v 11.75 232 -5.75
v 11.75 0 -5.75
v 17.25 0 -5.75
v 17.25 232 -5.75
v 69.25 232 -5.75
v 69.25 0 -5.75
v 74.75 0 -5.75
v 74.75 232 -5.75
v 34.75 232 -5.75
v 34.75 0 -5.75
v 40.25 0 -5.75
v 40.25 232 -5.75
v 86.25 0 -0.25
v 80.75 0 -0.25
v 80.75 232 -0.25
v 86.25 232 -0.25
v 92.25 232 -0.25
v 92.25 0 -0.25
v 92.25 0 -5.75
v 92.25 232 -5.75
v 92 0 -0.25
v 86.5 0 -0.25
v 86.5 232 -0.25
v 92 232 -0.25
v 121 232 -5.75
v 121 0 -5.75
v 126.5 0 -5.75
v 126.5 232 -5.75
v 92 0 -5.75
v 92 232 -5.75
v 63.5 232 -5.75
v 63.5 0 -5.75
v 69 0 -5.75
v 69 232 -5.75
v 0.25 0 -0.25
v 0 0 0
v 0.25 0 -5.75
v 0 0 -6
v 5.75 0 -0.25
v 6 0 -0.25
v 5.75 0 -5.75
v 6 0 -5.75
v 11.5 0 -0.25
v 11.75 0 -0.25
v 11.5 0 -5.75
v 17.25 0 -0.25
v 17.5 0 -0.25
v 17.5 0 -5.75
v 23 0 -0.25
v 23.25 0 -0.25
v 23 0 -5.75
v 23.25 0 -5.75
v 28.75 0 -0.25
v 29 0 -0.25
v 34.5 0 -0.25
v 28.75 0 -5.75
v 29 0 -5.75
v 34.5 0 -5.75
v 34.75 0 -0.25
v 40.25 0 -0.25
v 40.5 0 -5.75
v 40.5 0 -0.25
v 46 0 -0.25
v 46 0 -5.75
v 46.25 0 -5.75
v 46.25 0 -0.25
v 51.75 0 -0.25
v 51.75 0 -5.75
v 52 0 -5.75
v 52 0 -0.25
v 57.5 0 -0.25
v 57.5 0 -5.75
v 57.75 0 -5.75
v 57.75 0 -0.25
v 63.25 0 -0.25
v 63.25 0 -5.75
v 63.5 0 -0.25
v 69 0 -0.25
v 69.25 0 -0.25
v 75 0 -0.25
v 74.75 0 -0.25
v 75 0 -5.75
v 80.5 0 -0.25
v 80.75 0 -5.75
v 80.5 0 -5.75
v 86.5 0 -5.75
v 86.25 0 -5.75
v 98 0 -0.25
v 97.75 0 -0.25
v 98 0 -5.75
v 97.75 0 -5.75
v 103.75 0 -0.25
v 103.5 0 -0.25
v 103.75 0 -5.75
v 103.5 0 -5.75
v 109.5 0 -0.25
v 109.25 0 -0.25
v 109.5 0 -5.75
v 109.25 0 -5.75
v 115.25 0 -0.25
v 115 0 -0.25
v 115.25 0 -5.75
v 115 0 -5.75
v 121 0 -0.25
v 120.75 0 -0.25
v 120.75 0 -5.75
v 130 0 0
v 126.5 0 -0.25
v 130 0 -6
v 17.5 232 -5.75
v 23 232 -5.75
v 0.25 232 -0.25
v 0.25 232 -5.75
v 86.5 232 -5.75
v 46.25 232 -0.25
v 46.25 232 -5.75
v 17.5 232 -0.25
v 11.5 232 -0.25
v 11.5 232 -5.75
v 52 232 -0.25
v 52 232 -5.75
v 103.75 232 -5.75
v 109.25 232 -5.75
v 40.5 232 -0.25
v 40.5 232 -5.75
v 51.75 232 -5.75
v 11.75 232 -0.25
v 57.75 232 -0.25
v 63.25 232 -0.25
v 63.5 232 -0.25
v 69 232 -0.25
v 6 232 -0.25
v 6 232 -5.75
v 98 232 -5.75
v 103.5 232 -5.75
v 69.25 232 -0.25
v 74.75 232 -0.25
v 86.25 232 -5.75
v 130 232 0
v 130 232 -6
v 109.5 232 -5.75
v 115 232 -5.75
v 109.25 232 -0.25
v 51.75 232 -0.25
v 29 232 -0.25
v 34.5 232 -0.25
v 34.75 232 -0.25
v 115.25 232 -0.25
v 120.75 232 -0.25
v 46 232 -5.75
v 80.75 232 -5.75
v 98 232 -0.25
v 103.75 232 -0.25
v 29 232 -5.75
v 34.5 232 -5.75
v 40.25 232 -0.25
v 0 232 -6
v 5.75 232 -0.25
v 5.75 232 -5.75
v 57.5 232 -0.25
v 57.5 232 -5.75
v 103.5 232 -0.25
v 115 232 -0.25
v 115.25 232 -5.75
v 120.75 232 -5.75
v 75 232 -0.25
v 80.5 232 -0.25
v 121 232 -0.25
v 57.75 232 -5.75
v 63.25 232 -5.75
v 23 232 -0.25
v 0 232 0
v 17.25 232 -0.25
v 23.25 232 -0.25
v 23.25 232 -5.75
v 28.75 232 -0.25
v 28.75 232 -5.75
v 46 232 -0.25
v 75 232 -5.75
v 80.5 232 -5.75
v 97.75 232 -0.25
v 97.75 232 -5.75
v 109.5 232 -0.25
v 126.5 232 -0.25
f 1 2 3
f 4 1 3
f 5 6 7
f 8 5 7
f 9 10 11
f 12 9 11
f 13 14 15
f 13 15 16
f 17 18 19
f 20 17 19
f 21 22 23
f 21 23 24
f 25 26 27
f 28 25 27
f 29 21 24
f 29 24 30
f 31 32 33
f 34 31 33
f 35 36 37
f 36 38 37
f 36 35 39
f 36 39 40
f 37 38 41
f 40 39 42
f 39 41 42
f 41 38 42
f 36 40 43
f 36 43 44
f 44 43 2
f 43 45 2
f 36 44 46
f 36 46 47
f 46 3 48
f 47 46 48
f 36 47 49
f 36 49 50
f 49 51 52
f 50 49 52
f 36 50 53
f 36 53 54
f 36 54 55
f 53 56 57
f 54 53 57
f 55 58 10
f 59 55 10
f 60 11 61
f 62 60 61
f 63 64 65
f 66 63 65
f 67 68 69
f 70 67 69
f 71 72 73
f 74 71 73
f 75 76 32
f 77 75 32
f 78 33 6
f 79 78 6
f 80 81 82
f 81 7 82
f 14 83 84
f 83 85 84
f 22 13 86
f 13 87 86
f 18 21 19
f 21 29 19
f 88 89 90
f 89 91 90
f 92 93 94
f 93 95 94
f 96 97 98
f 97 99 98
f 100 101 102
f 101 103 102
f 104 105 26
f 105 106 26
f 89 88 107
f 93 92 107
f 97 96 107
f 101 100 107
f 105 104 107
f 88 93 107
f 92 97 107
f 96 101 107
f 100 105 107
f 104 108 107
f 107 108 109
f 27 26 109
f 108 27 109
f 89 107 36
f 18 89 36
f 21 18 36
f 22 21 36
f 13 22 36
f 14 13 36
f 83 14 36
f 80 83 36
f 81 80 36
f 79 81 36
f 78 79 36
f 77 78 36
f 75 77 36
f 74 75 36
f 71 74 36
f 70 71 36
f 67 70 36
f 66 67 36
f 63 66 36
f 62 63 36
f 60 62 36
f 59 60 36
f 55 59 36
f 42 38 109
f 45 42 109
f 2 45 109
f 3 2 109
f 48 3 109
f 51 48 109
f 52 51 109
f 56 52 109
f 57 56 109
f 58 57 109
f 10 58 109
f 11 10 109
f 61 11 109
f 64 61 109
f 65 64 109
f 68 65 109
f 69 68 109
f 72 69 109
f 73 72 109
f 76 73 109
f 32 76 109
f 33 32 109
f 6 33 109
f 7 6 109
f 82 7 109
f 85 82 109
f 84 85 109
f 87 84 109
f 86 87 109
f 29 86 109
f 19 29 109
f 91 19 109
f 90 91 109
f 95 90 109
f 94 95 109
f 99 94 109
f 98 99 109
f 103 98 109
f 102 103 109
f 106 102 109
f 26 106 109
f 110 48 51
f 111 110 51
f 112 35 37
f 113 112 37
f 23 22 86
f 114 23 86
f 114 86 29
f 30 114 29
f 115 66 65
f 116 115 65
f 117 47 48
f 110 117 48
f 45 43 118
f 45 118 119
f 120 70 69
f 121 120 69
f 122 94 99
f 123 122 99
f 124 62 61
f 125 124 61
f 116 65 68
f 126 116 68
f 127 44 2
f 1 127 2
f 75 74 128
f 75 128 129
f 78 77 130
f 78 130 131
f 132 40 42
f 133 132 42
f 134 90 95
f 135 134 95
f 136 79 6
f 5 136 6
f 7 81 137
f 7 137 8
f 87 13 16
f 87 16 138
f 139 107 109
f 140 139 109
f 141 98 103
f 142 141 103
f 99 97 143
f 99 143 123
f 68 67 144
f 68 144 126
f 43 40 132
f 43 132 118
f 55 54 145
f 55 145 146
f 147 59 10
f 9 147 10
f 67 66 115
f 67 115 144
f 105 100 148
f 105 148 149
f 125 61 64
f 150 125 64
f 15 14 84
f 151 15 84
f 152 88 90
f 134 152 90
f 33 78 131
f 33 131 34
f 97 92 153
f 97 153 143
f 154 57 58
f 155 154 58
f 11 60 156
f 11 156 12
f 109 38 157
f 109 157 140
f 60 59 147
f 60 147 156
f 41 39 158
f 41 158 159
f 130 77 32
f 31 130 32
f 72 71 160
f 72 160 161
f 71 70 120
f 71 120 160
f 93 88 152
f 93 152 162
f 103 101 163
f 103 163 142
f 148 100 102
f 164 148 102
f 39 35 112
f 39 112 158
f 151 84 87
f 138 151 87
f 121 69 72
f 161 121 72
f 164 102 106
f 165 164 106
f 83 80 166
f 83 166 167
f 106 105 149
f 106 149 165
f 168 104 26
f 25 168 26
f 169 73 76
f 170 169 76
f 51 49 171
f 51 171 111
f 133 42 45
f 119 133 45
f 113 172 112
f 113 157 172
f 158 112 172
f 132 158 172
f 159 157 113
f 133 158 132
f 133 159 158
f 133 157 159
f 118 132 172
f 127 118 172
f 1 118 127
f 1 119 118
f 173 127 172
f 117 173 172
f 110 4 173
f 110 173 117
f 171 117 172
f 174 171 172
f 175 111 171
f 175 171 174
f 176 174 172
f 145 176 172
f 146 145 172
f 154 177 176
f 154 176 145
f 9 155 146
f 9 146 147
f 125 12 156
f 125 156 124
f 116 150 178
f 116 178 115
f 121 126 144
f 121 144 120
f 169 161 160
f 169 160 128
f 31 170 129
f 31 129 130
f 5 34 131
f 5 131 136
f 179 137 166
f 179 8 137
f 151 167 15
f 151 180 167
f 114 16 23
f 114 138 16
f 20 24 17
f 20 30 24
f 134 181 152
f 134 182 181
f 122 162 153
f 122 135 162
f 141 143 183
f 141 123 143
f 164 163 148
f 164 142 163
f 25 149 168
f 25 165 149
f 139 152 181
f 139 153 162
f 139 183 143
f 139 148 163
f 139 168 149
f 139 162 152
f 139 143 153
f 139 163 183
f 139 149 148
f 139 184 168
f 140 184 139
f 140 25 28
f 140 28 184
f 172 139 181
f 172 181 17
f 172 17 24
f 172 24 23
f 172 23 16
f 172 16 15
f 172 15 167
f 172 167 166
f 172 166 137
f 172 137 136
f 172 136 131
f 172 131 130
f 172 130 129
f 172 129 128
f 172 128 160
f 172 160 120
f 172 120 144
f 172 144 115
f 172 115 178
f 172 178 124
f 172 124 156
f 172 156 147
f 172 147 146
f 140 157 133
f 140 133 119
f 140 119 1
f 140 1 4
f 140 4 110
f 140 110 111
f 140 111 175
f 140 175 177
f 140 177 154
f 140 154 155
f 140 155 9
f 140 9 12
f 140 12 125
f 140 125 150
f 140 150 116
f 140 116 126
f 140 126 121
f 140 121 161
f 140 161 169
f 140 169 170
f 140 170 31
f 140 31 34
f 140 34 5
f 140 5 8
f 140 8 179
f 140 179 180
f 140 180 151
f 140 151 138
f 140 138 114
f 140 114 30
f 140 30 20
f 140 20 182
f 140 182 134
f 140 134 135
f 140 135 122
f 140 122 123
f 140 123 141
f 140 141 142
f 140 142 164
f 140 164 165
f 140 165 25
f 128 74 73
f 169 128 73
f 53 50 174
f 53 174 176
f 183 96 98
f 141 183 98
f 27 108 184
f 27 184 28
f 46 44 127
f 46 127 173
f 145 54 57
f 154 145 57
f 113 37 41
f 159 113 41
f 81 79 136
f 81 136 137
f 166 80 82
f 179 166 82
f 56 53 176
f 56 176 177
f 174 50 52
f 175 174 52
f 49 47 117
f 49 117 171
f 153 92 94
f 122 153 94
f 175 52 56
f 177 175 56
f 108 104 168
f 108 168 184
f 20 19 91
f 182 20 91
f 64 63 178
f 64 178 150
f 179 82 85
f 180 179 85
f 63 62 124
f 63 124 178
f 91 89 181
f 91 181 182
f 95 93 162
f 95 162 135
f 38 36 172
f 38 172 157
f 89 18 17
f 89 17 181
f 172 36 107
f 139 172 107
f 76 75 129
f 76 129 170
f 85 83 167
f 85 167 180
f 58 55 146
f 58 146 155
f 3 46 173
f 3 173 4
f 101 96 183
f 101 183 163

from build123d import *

# Parameters (mm, degrees)
SKETCH1_W           = 130
SKETCH1_H           = 6
SKETCH1_W_2         = 5.5
SKETCH1_H_2         = 5.5
BOSS_EXTRUDE1_DEPTH = 232


with BuildPart() as part:
    # Sketch1 → Boss-Extrude1 (new body)
    with BuildSketch(Plane(origin=(0, 0, 0), x_dir=(1, 0, 0), z_dir=(0, 1, 0))):
        with Locations((65, 3)):
            Rectangle(SKETCH1_W, SKETCH1_H)
        with Locations((8.75, 3)):
            Rectangle(SKETCH1_W_2, SKETCH1_H_2, mode=Mode.SUBTRACT)
        with Locations((3, 3)):
            Rectangle(SKETCH1_W_2, SKETCH1_H_2, mode=Mode.SUBTRACT)
        with Locations((14.5, 3)):
            Rectangle(SKETCH1_W_2, SKETCH1_H_2, mode=Mode.SUBTRACT)
        with Locations((20.25, 3)):
            Rectangle(SKETCH1_W_2, SKETCH1_H_2, mode=Mode.SUBTRACT)
        with Locations((26, 3)):
            Rectangle(SKETCH1_W_2, SKETCH1_H_2, mode=Mode.SUBTRACT)
        with Locations((31.75, 3)):
            Rectangle(SKETCH1_W_2, SKETCH1_H_2, mode=Mode.SUBTRACT)
        with Locations((37.5, 3)):
            Rectangle(SKETCH1_W_2, SKETCH1_H_2, mode=Mode.SUBTRACT)
        with Locations((43.25, 3)):
            Rectangle(SKETCH1_W_2, SKETCH1_H_2, mode=Mode.SUBTRACT)
        with Locations((49, 3)):
            Rectangle(SKETCH1_W_2, SKETCH1_H_2, mode=Mode.SUBTRACT)
        with Locations((54.75, 3)):
            Rectangle(SKETCH1_W_2, SKETCH1_H_2, mode=Mode.SUBTRACT)
        with Locations((60.5, 3)):
            Rectangle(SKETCH1_W_2, SKETCH1_H_2, mode=Mode.SUBTRACT)
        with Locations((66.25, 3)):
            Rectangle(SKETCH1_W_2, SKETCH1_H_2, mode=Mode.SUBTRACT)
        with Locations((72, 3)):
            Rectangle(SKETCH1_W_2, SKETCH1_H_2, mode=Mode.SUBTRACT)
        with Locations((77.75, 3)):
            Rectangle(SKETCH1_W_2, SKETCH1_H_2, mode=Mode.SUBTRACT)
        with Locations((83.5, 3)):
            Rectangle(SKETCH1_W_2, SKETCH1_H_2, mode=Mode.SUBTRACT)
        with Locations((89.25, 3)):
            Rectangle(SKETCH1_W_2, SKETCH1_H_2, mode=Mode.SUBTRACT)
        with Locations((95, 3)):
            Rectangle(SKETCH1_W_2, SKETCH1_H_2, mode=Mode.SUBTRACT)
        with Locations((100.75, 3)):
            Rectangle(SKETCH1_W_2, SKETCH1_H_2, mode=Mode.SUBTRACT)
        with Locations((106.5, 3)):
            Rectangle(SKETCH1_W_2, SKETCH1_H_2, mode=Mode.SUBTRACT)
        with Locations((112.25, 3)):
            Rectangle(SKETCH1_W_2, SKETCH1_H_2, mode=Mode.SUBTRACT)
        with Locations((118, 3)):
            Rectangle(SKETCH1_W_2, SKETCH1_H_2, mode=Mode.SUBTRACT)
        with Locations((123.75, 3)):
            Rectangle(SKETCH1_W_2, SKETCH1_H_2, mode=Mode.SUBTRACT)
    extrude(amount=BOSS_EXTRUDE1_DEPTH)


solid = part.part
